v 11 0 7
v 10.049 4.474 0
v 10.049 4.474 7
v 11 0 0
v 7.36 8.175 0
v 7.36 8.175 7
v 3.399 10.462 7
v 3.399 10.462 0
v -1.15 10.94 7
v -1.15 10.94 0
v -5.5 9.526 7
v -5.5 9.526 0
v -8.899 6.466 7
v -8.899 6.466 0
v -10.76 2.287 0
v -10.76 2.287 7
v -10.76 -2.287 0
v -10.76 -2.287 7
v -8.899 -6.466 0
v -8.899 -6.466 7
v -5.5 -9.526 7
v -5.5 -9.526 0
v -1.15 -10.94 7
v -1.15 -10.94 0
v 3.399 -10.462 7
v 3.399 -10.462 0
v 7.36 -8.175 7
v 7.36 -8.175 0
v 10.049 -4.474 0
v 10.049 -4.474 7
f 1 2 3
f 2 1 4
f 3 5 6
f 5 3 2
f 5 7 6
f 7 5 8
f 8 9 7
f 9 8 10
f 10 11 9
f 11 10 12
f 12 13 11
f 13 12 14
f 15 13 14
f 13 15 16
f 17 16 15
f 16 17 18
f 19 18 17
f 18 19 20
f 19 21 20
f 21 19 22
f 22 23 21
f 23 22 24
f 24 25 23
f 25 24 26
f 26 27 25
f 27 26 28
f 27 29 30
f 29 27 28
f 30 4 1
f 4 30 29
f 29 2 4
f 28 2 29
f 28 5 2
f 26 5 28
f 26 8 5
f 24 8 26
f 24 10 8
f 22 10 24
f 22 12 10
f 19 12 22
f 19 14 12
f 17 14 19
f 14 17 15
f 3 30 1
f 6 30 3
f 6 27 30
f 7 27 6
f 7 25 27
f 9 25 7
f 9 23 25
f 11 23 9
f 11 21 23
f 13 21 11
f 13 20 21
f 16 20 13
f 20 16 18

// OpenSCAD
$fn = 15;
//bearing
color("yellow")
cylinder(d=22, h=7);

//wheel
//cylinder(d=31, h=21, center=true, $fn = 8);
